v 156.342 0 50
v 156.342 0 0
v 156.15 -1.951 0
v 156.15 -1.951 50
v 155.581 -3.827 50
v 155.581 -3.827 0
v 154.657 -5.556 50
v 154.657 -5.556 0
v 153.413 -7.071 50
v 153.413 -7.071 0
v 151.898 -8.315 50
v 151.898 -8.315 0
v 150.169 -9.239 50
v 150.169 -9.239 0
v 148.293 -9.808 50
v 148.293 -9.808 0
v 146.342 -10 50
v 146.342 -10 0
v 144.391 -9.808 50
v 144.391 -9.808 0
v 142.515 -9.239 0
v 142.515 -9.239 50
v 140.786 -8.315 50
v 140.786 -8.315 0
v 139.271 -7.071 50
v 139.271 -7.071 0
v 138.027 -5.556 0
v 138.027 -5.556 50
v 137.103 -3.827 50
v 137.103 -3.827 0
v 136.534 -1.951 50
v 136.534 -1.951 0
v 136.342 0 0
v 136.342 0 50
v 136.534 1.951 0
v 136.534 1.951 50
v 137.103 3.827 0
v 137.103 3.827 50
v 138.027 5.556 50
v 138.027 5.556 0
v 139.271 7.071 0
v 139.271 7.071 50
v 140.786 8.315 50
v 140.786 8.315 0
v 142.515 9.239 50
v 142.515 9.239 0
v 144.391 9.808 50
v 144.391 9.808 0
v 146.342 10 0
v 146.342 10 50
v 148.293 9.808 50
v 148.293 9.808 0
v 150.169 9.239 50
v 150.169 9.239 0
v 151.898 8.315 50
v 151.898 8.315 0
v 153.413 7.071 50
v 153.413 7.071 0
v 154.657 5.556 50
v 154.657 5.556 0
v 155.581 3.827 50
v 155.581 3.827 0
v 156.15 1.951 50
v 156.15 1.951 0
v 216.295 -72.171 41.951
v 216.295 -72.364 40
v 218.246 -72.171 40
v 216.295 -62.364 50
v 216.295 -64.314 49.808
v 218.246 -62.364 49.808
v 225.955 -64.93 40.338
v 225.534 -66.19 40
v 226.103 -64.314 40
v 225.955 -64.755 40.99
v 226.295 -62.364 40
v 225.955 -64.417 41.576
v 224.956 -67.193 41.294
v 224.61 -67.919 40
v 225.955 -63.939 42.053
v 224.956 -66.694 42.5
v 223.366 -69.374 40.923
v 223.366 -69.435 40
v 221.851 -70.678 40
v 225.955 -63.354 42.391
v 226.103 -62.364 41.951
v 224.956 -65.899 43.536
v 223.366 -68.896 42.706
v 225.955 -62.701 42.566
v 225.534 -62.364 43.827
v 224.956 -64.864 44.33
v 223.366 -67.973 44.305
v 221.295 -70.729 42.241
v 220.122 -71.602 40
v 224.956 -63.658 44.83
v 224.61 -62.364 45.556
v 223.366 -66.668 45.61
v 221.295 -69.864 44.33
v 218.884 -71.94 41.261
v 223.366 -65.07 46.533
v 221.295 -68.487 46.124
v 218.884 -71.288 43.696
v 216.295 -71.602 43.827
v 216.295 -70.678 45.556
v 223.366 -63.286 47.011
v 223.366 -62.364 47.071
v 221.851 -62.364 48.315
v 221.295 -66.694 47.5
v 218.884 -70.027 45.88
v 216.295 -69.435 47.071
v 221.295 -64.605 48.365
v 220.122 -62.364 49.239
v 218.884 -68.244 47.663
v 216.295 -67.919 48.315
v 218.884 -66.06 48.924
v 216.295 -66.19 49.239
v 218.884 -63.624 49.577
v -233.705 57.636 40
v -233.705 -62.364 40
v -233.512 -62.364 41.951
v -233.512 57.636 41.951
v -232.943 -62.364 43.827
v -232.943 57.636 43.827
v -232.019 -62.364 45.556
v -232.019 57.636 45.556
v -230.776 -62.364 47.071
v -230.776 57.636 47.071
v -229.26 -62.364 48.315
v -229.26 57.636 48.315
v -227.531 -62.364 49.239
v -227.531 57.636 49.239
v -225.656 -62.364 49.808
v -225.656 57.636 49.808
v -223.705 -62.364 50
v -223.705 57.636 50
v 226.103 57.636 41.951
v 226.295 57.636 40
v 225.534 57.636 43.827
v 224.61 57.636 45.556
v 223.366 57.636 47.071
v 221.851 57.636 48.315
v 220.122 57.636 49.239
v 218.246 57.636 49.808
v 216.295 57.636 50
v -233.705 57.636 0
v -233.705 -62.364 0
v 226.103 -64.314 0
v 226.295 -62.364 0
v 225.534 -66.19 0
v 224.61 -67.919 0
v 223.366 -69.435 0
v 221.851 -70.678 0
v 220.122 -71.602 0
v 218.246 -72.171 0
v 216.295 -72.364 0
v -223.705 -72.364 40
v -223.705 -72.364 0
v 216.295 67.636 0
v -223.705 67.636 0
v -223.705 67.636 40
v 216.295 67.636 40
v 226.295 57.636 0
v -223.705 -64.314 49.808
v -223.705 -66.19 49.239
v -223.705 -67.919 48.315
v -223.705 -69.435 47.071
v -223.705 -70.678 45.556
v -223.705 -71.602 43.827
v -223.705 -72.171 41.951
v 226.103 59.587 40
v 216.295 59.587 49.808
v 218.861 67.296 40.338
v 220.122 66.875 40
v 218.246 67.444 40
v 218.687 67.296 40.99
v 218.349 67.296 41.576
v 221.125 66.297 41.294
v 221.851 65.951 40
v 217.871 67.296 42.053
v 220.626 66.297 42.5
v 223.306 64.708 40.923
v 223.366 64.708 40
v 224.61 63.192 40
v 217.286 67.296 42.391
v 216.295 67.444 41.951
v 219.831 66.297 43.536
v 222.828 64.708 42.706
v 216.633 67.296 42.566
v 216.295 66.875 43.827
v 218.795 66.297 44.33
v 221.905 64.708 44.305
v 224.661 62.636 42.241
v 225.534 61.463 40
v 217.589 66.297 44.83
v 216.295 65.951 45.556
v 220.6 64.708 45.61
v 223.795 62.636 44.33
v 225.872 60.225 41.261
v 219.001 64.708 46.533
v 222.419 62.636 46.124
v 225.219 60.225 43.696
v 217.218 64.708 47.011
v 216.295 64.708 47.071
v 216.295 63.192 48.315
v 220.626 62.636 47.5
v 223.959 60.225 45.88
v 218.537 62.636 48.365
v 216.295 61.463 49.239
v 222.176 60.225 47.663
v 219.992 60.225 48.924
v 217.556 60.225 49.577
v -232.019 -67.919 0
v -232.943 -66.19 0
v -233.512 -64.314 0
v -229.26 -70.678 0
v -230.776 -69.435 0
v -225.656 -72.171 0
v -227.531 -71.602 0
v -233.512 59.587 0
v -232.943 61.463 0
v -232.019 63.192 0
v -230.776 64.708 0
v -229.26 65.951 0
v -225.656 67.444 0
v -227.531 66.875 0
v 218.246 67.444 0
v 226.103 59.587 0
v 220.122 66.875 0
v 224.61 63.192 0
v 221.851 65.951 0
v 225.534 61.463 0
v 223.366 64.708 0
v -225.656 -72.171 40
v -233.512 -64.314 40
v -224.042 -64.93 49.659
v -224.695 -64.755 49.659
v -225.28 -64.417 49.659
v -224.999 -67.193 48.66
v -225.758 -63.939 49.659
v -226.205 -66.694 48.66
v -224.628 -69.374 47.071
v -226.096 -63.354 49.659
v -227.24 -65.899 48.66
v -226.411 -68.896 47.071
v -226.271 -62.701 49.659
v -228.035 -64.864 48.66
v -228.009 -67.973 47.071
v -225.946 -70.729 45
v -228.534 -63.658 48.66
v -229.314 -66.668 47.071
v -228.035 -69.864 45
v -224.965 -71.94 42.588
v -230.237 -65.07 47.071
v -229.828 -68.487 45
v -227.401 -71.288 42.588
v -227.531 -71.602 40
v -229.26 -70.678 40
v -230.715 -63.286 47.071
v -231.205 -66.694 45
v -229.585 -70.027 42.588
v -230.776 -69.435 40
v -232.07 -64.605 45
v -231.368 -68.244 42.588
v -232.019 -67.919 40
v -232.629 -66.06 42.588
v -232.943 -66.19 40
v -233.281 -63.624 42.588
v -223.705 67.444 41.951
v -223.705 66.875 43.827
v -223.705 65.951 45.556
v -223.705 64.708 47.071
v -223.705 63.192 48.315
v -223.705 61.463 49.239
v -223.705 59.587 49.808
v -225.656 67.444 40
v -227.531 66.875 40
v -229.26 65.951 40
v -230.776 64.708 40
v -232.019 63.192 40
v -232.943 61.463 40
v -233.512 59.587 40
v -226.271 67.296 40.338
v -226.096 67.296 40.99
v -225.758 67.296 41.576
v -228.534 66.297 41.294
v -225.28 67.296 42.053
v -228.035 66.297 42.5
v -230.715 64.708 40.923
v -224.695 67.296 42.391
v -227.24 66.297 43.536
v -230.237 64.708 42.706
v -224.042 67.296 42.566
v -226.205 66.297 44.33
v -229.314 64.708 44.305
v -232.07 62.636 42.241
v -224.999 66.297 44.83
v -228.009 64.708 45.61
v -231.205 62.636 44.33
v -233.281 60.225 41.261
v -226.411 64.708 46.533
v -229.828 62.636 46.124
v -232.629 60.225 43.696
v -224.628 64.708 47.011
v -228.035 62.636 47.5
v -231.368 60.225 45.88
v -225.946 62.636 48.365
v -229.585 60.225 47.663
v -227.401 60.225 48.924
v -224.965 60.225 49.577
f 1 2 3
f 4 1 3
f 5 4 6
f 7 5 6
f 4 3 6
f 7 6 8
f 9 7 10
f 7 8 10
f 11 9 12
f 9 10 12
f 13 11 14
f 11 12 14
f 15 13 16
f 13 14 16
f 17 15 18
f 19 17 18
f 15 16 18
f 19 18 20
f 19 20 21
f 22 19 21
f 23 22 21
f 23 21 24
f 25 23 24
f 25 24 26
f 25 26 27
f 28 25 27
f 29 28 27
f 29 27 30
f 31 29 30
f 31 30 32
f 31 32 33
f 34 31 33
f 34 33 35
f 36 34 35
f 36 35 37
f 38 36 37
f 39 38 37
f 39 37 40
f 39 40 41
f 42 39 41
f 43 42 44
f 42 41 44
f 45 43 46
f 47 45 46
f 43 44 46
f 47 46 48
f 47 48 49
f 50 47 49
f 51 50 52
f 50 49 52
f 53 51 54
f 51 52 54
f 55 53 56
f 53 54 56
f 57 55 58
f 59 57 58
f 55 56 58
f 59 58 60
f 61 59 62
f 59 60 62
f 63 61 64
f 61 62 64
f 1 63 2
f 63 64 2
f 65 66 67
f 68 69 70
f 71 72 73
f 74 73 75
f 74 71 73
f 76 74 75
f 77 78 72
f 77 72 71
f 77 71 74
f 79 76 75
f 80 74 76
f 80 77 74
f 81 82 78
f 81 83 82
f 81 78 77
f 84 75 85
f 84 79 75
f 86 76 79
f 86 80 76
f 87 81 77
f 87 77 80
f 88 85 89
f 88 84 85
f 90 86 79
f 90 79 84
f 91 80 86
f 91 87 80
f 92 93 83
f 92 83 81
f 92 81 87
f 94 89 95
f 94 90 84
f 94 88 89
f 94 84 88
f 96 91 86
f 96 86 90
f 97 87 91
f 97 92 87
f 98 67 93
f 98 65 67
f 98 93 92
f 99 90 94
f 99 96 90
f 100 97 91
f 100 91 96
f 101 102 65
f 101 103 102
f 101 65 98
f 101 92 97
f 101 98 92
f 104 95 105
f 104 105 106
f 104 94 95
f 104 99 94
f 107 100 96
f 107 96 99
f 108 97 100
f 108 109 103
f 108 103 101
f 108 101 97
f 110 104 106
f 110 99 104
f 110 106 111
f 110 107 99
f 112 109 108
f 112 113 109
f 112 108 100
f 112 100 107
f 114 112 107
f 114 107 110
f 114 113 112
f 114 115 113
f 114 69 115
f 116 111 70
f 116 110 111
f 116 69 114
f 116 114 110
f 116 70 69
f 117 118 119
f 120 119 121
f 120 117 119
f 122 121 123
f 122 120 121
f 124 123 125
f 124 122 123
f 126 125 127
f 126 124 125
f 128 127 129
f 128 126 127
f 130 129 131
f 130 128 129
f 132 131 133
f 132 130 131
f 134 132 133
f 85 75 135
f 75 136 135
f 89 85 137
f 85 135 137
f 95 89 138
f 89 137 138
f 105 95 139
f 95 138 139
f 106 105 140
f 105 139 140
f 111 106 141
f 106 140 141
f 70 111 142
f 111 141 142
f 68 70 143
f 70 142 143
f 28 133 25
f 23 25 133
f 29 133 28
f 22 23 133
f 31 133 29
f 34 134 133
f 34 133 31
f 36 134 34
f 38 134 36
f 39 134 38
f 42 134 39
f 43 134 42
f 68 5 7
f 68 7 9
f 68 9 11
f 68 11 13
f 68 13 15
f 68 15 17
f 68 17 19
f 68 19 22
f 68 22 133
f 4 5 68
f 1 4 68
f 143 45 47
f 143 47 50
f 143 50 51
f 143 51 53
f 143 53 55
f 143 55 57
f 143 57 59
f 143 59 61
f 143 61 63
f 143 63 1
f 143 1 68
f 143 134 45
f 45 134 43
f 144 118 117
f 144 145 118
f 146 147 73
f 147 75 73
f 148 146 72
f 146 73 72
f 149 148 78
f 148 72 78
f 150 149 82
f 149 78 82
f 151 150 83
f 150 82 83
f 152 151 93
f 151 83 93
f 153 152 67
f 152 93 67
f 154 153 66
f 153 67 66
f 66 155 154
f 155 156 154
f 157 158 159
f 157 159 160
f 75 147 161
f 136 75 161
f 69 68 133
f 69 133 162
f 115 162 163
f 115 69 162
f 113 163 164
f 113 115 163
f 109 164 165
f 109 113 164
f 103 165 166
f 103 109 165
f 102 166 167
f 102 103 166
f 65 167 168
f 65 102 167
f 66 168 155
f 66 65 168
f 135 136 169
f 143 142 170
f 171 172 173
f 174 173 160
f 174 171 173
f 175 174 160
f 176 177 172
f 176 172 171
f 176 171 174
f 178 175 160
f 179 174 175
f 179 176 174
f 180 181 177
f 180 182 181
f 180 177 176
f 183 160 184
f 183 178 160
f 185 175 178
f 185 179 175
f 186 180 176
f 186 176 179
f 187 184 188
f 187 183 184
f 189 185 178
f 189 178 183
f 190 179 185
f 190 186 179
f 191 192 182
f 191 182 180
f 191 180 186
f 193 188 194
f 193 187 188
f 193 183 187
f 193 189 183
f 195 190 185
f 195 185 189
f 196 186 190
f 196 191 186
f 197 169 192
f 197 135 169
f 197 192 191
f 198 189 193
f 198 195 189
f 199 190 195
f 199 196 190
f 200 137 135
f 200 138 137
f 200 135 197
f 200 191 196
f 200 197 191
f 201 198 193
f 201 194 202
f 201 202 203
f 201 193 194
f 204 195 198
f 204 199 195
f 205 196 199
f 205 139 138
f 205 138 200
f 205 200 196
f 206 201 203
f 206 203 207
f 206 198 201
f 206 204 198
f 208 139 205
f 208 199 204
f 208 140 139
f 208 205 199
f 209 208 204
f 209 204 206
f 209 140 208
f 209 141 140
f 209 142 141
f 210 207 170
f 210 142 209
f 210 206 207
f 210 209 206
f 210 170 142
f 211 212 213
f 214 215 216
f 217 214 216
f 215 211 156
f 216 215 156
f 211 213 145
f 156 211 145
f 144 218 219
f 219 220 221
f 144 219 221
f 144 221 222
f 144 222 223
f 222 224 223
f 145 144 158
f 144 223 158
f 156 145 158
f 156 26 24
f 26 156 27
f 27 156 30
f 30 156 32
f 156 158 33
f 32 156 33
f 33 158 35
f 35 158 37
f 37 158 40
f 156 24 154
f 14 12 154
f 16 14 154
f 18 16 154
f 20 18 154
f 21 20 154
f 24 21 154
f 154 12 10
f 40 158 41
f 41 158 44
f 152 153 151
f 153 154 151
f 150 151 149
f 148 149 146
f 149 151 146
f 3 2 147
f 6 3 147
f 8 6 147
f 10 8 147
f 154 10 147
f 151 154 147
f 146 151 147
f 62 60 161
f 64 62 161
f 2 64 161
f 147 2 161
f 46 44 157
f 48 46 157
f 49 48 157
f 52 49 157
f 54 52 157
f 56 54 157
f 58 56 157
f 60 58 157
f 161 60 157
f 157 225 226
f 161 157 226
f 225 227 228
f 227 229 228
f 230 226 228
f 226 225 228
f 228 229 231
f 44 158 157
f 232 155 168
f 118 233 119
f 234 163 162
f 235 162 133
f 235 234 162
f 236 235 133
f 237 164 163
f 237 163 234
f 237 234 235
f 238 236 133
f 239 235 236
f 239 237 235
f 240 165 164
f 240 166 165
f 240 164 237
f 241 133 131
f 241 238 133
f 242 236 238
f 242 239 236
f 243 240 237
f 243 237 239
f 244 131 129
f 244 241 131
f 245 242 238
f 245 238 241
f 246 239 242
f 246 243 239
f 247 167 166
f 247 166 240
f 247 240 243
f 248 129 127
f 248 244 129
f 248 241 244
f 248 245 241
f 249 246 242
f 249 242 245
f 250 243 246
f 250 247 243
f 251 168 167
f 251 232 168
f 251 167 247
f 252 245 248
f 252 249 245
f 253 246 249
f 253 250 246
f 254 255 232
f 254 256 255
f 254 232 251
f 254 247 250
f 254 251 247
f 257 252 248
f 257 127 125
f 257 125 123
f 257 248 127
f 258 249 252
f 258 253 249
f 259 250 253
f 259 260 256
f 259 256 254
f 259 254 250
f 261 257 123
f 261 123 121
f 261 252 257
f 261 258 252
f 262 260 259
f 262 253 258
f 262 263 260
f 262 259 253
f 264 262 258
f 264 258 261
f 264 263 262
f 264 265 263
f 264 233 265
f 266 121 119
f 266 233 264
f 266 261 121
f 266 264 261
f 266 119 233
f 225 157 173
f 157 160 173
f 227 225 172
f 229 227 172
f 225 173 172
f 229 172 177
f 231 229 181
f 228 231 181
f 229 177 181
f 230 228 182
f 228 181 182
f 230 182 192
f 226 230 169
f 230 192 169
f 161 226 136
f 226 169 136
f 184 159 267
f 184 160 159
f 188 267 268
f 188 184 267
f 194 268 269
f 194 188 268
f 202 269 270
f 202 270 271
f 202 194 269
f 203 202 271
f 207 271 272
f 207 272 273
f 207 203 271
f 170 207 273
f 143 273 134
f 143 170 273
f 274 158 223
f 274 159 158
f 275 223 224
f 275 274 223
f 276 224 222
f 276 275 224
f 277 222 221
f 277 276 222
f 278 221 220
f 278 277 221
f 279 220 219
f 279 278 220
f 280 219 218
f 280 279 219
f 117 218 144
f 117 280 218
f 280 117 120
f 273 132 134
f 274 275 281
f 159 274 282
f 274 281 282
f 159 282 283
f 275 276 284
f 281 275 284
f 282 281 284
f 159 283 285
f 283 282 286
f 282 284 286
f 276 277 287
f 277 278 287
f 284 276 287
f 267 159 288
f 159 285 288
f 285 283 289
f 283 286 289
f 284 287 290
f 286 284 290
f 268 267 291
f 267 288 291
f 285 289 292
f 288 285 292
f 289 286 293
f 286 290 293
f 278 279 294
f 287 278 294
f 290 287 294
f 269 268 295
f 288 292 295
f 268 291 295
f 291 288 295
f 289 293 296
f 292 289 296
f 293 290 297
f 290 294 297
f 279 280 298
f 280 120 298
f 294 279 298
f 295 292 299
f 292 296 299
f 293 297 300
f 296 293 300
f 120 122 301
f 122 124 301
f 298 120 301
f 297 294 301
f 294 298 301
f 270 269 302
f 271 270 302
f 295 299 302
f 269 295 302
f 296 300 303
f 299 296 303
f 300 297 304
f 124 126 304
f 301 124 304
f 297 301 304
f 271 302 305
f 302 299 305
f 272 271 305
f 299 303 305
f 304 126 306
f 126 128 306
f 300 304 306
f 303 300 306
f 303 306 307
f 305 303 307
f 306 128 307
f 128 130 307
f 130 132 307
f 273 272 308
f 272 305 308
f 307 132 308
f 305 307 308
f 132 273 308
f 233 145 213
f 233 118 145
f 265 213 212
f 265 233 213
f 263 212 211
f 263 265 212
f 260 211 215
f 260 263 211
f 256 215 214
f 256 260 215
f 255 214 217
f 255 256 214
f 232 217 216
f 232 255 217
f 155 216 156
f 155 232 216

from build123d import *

# Parameters (mm, degrees)
F0_W      = 460
F0_H      = 140
F1_DEPTH  = 50
F2_R      = 10
F3_DEPTH  = 25
F3_FACE_R = 10
F4_DEPTH  = 25
F5_R      = 10
F6_R      = 10


with BuildPart() as f1:
    # F0 (on Top) → F1 (new body)
    with BuildSketch(Plane.XY):
        with Locations((-3.7046, -2.36354)):
            Rectangle(F0_W, F0_H)
    extrude(amount=F1_DEPTH)

    # F2 (on face) → F3 (cut)
    with BuildSketch(Plane(origin=(0, 0, 0), x_dir=(1, 0, 0), z_dir=(0, 0, -1))):
        with Locations((146.342196, 0)):
            Circle(F2_R)
    extrude(amount=-F3_DEPTH, mode=Mode.SUBTRACT)

    # F3_face (on face) → F4 (cut)
    with BuildSketch(Plane(origin=(146.342196, 0, 25), x_dir=(1, 0, 0), z_dir=(0, 0, -1))):
        Circle(F3_FACE_R)
    extrude(amount=-F4_DEPTH, mode=Mode.SUBTRACT)

    # F5
    f5_edges = [f1.edges().sort_by_distance(p)[0] for p in [
        (-233.7046, -72.36354, 25),
        (-3.7046, -72.36354, 50),
        (-233.7046, -2.36354, 50),
    ]]
    fillet(f5_edges, radius=F5_R)

    # F6
    f6_edges = [f1.edges().sort_by_distance(p)[0] for p in [
        (226.2954, -72.36354, 20),
        (226.2954, 67.63646, 25),
        (1.2954, 67.63646, 50),
    ]]
    fillet(f6_edges, radius=F6_R)


solid = f1.part
